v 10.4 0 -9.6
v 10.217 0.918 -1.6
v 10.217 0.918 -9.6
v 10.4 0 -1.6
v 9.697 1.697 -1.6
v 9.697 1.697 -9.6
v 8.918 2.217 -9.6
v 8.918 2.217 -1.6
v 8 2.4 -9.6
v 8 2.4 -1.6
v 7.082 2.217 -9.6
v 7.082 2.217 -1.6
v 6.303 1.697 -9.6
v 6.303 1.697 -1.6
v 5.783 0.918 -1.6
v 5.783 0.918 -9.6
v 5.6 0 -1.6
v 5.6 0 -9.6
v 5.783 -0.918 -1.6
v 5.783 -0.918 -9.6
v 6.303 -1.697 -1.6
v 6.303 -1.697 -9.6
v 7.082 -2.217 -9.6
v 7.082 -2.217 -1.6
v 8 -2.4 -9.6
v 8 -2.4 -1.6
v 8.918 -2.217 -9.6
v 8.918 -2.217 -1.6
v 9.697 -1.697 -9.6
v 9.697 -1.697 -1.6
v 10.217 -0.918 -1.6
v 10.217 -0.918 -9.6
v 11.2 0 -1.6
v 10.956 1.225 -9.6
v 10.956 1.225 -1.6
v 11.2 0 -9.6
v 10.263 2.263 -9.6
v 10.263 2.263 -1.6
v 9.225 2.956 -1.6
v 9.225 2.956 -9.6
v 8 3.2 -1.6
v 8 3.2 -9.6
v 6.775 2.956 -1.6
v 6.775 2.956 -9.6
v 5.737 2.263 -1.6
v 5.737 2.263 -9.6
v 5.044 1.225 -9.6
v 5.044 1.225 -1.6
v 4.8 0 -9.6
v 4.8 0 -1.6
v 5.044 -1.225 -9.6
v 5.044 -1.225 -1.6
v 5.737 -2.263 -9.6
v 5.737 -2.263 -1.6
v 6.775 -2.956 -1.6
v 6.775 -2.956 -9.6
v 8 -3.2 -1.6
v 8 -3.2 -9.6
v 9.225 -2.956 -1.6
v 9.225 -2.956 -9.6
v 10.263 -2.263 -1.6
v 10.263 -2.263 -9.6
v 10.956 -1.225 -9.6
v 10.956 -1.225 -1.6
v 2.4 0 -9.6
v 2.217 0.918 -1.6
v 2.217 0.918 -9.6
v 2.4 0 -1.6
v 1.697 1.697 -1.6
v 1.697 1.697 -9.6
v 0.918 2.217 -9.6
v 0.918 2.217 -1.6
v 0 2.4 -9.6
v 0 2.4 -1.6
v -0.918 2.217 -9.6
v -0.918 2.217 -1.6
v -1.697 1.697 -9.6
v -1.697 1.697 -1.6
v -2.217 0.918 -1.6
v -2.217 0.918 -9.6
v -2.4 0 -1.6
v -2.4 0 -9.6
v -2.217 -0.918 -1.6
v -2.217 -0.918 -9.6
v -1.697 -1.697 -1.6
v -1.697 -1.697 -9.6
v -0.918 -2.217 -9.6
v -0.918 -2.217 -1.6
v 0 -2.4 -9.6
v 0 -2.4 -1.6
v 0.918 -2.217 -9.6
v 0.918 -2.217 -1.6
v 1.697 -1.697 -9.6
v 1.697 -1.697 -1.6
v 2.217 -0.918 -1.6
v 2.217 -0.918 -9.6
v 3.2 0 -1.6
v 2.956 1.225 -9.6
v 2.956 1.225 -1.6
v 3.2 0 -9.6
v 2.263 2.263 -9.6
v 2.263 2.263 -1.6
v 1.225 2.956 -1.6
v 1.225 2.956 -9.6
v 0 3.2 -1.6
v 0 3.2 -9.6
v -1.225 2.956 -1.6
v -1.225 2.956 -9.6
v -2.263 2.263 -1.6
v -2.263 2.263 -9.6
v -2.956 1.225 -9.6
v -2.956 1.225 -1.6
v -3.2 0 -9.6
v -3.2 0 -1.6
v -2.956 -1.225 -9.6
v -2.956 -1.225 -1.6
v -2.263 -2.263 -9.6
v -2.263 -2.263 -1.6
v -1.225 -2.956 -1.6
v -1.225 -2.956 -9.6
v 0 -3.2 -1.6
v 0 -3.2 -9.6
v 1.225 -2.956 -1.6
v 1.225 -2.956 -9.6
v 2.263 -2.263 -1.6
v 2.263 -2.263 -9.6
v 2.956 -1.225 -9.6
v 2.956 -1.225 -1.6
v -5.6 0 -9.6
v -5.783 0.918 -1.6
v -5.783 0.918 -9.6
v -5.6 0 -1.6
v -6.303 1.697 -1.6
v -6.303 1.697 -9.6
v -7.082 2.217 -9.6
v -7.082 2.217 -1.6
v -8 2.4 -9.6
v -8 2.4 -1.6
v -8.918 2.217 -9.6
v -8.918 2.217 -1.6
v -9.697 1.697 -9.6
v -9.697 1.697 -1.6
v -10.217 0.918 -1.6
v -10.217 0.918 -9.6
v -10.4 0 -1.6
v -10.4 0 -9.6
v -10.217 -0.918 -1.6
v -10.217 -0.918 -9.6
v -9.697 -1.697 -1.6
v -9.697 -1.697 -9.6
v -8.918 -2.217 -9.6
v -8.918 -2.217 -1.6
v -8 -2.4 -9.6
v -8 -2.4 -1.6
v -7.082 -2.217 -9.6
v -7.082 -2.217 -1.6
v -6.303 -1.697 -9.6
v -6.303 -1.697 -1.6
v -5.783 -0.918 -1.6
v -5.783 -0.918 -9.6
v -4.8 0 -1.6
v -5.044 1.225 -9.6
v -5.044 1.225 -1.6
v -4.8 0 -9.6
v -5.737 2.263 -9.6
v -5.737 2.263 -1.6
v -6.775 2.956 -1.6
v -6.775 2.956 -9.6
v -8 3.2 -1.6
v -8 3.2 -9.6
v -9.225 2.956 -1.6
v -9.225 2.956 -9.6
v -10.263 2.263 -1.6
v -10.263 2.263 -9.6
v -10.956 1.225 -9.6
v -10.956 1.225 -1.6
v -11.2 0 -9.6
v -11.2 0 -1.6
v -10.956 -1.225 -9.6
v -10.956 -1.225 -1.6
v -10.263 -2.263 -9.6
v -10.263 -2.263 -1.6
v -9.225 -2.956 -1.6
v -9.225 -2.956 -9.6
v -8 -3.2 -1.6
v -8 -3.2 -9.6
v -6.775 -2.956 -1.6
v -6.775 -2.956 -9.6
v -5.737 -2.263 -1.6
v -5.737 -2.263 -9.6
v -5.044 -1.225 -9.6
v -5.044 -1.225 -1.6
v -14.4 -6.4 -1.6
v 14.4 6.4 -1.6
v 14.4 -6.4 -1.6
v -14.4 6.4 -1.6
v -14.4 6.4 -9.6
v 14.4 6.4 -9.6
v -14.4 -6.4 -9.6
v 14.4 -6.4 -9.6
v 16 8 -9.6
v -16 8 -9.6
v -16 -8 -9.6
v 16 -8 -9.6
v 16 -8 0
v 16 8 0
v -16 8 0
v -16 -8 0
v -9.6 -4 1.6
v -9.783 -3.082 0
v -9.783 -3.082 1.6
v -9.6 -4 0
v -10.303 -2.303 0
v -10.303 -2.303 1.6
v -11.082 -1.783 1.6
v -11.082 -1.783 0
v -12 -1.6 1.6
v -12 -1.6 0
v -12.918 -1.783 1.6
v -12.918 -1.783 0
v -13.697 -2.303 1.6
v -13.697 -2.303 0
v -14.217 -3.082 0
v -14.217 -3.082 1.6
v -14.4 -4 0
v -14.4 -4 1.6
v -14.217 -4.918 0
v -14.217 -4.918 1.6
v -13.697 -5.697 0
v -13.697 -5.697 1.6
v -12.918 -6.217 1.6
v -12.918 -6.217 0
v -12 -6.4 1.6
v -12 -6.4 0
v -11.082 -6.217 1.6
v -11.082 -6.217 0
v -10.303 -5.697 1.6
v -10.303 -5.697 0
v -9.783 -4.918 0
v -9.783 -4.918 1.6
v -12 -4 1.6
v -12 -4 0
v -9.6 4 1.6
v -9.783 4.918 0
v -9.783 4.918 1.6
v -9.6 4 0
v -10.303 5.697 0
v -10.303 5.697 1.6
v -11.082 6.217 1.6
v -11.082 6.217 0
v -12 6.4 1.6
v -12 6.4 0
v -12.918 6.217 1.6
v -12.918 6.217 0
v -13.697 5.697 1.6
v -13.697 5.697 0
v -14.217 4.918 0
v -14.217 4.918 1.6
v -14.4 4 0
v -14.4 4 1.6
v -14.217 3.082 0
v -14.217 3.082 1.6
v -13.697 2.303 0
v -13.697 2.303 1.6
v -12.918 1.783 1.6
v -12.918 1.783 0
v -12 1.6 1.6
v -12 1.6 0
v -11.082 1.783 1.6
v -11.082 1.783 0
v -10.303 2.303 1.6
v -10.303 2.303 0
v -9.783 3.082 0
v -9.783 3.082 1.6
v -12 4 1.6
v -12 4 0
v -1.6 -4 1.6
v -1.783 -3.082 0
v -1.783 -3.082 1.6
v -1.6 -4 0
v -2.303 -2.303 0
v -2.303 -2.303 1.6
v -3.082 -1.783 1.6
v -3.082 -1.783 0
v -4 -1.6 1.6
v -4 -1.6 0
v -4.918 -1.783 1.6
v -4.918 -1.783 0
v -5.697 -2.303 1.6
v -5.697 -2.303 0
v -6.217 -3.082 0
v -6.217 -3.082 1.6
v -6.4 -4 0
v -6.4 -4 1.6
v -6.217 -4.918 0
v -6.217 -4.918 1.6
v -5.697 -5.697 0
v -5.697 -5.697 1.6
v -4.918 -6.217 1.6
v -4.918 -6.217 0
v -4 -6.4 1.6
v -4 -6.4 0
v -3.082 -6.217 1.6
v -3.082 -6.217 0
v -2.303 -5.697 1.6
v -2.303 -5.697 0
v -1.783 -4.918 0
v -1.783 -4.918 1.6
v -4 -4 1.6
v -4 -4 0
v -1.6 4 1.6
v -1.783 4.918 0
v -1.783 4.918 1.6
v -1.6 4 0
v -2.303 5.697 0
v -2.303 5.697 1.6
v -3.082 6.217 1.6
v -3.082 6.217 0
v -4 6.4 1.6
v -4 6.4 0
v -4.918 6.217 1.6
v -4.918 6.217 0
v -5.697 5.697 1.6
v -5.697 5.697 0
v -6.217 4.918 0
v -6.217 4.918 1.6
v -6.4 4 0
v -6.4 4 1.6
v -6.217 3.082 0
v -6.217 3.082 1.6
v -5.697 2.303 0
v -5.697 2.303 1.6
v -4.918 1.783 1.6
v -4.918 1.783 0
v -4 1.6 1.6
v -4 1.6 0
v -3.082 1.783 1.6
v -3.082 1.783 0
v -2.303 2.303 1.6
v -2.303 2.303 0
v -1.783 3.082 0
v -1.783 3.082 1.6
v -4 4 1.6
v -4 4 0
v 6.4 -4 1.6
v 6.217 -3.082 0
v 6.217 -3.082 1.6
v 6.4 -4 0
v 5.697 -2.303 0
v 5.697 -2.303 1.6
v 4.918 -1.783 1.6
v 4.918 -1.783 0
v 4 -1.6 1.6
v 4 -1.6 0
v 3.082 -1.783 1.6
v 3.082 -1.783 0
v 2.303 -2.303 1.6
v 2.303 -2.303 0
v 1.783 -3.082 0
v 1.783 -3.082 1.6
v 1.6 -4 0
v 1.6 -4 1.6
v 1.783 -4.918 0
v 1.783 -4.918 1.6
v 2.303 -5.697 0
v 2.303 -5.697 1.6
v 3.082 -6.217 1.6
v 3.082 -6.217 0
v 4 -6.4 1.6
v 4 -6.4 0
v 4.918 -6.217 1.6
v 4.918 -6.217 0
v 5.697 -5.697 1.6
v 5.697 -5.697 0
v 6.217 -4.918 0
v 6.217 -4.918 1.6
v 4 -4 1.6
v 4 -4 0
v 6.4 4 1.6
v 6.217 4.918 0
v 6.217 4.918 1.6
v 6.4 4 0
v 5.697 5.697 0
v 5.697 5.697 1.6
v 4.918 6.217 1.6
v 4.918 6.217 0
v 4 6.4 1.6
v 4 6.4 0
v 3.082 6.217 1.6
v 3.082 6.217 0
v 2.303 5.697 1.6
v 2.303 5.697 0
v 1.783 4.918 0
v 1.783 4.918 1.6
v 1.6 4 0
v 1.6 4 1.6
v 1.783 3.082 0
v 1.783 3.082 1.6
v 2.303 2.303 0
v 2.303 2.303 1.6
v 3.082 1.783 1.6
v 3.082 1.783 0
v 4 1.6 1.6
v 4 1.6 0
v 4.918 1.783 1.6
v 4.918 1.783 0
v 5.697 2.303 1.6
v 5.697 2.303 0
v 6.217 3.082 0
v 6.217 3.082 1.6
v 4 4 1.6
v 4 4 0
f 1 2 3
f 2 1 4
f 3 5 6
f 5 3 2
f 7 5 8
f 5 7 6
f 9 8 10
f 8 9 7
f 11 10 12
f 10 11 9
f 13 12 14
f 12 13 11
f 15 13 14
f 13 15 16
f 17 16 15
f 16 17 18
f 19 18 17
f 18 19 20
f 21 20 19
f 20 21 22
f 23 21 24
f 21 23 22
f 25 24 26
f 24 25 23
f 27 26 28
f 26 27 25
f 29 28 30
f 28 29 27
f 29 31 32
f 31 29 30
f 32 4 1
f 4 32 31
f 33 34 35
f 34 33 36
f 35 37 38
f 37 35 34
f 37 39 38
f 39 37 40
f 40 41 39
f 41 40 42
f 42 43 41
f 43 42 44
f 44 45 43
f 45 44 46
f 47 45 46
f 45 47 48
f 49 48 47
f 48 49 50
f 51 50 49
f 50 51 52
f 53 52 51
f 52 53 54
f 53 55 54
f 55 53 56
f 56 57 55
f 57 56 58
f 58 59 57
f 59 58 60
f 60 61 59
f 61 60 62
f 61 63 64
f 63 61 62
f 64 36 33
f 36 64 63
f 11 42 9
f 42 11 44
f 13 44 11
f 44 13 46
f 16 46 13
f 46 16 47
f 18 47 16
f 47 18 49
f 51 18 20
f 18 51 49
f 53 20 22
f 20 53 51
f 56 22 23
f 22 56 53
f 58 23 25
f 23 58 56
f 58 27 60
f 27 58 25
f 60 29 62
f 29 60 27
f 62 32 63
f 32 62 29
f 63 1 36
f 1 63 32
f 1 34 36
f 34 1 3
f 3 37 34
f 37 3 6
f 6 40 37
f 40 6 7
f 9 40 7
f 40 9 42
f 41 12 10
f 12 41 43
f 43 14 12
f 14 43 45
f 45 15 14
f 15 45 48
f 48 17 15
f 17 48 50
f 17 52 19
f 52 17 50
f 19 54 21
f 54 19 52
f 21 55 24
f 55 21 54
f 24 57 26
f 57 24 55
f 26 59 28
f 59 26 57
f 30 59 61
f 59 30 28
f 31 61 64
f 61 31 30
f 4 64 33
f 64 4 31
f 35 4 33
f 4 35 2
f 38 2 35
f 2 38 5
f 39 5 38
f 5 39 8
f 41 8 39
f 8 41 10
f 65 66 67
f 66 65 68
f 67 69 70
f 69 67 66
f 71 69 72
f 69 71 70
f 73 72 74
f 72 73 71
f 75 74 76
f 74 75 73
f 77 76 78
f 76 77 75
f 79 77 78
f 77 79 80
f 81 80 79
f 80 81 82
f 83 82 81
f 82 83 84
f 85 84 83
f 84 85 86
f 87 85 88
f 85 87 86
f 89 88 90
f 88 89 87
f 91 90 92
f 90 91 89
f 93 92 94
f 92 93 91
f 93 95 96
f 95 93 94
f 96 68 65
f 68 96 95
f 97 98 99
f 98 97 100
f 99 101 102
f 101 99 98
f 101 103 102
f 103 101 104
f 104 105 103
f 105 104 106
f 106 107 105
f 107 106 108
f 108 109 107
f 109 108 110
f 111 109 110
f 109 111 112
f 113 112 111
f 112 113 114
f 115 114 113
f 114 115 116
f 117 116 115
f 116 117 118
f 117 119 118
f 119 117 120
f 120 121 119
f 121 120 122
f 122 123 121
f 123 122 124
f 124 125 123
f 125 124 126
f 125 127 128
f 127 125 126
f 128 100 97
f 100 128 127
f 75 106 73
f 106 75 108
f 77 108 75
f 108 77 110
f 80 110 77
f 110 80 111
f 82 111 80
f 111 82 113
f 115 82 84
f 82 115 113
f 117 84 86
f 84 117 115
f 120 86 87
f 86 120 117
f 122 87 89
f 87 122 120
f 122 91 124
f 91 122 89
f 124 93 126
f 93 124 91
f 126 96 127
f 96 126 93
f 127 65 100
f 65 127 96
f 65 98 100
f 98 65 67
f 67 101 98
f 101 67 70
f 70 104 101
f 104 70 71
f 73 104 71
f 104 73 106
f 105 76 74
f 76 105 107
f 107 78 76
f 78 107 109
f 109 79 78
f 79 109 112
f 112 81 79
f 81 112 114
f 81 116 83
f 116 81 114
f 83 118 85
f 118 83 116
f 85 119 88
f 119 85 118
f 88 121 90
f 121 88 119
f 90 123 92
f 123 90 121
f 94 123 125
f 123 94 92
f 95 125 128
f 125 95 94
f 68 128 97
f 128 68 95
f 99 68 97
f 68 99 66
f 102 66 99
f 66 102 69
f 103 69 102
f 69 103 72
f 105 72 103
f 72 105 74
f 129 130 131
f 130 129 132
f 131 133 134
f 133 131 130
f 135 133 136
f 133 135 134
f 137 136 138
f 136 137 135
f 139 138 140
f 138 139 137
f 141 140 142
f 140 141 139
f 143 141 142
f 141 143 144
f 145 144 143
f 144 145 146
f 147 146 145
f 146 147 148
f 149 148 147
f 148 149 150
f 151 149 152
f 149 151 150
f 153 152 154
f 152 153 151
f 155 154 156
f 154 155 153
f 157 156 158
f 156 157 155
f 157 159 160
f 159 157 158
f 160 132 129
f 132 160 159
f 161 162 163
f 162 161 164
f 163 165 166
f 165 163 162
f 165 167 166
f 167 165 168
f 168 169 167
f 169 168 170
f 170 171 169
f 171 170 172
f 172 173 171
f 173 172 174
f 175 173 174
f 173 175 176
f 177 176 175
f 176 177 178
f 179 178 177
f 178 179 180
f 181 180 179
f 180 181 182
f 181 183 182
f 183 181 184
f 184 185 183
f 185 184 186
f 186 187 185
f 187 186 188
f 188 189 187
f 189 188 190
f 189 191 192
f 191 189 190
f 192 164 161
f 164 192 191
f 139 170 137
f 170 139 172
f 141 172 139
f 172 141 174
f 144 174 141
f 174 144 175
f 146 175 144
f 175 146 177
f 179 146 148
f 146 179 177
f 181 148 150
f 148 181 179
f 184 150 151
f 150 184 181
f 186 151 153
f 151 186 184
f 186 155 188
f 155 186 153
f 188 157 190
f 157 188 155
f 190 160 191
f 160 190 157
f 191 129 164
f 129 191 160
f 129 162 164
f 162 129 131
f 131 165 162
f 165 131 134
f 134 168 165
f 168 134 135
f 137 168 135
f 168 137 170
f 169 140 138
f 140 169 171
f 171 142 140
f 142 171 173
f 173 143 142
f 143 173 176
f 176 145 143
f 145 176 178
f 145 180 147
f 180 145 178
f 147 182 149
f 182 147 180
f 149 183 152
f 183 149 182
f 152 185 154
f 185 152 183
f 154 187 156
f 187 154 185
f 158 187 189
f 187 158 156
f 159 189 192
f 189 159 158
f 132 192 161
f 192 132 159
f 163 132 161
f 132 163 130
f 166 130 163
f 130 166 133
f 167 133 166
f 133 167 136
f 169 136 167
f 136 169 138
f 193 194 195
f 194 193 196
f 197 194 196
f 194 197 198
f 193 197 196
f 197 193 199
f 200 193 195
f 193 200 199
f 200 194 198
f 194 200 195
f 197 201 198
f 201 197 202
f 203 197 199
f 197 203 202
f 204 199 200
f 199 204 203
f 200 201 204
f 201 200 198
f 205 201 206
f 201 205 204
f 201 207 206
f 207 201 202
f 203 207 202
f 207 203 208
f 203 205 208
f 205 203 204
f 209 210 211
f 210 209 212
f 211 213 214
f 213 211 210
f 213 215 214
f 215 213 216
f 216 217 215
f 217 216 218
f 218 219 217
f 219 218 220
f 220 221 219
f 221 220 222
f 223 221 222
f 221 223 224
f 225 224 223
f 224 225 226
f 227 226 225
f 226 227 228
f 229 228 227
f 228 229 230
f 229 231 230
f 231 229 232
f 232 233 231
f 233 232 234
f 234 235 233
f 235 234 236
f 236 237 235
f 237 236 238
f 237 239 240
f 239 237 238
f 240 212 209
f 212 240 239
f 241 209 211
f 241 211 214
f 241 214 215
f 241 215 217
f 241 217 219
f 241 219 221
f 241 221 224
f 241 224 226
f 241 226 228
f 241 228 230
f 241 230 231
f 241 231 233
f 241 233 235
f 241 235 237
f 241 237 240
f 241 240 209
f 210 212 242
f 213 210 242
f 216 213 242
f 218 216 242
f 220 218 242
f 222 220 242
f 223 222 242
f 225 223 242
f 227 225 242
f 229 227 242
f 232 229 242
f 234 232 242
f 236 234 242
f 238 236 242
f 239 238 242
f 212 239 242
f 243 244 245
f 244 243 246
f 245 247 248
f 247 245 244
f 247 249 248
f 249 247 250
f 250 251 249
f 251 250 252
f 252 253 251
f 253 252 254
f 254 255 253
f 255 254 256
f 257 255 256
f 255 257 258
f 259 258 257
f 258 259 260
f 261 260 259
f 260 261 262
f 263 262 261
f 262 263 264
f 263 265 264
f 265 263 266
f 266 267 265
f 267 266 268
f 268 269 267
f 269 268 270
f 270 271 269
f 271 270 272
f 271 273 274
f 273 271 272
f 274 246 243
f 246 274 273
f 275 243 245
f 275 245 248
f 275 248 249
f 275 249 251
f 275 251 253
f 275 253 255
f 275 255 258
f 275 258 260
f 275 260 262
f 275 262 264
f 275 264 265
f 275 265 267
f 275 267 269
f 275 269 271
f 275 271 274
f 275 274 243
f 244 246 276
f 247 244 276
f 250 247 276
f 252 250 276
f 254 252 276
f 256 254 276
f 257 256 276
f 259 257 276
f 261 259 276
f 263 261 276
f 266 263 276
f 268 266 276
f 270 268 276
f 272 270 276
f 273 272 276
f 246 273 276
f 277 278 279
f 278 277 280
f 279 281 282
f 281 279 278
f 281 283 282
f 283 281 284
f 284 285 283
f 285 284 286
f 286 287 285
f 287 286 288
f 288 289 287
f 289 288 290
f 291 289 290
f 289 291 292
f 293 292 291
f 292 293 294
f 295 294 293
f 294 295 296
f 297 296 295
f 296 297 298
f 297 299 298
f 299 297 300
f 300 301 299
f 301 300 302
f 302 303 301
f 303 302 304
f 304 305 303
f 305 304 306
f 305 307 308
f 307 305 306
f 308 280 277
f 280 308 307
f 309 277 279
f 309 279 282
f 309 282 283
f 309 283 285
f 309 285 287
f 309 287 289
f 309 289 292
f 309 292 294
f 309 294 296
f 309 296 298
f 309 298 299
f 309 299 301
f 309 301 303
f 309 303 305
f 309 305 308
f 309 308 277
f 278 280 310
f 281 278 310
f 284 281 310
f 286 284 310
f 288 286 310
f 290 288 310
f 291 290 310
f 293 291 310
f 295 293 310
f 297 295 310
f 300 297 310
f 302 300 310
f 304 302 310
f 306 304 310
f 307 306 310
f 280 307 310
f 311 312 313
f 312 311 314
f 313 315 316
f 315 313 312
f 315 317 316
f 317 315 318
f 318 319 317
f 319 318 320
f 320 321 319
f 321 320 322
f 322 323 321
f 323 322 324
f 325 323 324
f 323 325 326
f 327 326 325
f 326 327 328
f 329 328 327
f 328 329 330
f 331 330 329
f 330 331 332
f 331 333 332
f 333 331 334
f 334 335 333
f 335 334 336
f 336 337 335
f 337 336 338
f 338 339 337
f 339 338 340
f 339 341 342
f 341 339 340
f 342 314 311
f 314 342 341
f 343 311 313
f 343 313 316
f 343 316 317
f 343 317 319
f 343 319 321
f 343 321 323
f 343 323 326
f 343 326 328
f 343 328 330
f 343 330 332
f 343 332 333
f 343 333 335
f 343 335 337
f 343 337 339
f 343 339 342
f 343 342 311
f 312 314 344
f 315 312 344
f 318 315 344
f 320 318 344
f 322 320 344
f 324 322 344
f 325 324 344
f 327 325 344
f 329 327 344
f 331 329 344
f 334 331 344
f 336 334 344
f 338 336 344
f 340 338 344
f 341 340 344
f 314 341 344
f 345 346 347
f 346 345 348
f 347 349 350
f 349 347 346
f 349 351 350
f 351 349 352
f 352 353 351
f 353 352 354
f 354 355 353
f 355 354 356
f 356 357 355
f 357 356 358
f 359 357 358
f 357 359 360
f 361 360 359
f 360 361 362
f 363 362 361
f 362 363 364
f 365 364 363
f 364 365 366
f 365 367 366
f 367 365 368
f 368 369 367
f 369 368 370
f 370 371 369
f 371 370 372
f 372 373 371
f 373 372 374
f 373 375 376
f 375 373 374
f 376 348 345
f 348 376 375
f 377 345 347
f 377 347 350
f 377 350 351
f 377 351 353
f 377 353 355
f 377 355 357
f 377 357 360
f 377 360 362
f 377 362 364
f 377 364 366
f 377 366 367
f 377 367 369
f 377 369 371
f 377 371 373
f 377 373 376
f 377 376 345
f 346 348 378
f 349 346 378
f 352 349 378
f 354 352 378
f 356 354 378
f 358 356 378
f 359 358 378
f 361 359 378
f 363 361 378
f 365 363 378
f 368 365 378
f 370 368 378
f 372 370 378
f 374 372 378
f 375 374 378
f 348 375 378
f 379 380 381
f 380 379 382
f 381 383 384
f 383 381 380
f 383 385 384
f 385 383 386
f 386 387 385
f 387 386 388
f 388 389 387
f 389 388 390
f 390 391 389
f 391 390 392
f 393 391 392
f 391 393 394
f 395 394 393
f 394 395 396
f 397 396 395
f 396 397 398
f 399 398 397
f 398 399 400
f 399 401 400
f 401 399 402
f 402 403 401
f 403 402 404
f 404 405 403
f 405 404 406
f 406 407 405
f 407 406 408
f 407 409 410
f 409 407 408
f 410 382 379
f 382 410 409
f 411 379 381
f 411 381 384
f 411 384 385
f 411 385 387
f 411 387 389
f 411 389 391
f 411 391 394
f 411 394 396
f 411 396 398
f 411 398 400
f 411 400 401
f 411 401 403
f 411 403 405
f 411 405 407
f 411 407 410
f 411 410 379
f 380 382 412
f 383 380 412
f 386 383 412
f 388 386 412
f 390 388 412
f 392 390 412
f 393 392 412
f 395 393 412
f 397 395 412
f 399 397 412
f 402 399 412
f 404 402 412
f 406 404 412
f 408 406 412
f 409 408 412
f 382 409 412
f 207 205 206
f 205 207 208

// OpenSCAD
// file: ../p/4-4ring3.scad
use <../lib.scad>
$fa=1; $fs=0.2;
function ldraw_lib__4_4ring3(realsolid=false) = [
// 0 Ring  3 x 1.0
// 0 Name: 4-4ring3.dat
// 0 Author: James Jessiman
// 0 !LDRAW_ORG Primitive UPDATE 2009-01
// 0 !LICENSE Licensed under CC BY 2.0 and CC BY 4.0 : see CAreadme.txt
// 
// 0 BFC CERTIFY CCW
  [0,"BFC","CERTIFY"],
  [0,"BFC","CCW"],
// 
// 0 !HISTORY 1998-12-15 [PTadmin] Official Update 1998-10
// 0 !HISTORY 2002-04-05 [hafhead] Added BFC statement
// 0 !HISTORY 2002-04-25 [PTadmin] Official Update 2002-02
// 0 !HISTORY 2007-06-24 [PTadmin] Header formatted for Contributor Agreement
// 0 !HISTORY 2008-07-01 [PTadmin] Official Update 2008-01
// 0 !HISTORY 2008-08-26 [cwdee] Switch polygon winding and rename
// 0 !HISTORY 2009-05-02 [PTadmin] Official Update 2009-01
// 
// 
// 4 16 -1.5308 0 3.6956 -1.1481 0 2.7717 0 0 3 0 0 4
  [4,16,-1.5308,0,3.6956,-1.1481,0,2.7717,0,0,3,0,0,4],
// 4 16 -2.8284 0 2.8284 -2.1213 0 2.1213 -1.1481 0 2.7717 -1.5308 0 3.6956
  [4,16,-2.8284,0,2.8284,-2.1213,0,2.1213,-1.1481,0,2.7717,-1.5308,0,3.6956],
// 4 16 -3.6956 0 1.5308 -2.7717 0 1.1481 -2.1213 0 2.1213 -2.8284 0 2.8284
  [4,16,-3.6956,0,1.5308,-2.7717,0,1.1481,-2.1213,0,2.1213,-2.8284,0,2.8284],
// 4 16 -4 0 0 -3 0 0 -2.7717 0 1.1481 -3.6956 0 1.5308
  [4,16,-4,0,0,-3,0,0,-2.7717,0,1.1481,-3.6956,0,1.5308],
// 4 16 -3.6956 0 -1.5308 -2.7717 0 -1.1481 -3 0 0 -4 0 0
  [4,16,-3.6956,0,-1.5308,-2.7717,0,-1.1481,-3,0,0,-4,0,0],
// 4 16 -2.8284 0 -2.8284 -2.1213 0 -2.1213 -2.7717 0 -1.1481 -3.6956 0 -1.5308
  [4,16,-2.8284,0,-2.8284,-2.1213,0,-2.1213,-2.7717,0,-1.1481,-3.6956,0,-1.5308],
// 4 16 -1.5308 0 -3.6956 -1.1481 0 -2.7717 -2.1213 0 -2.1213 -2.8284 0 -2.8284
  [4,16,-1.5308,0,-3.6956,-1.1481,0,-2.7717,-2.1213,0,-2.1213,-2.8284,0,-2.8284],
// 4 16 0 0 -4 0 0 -3 -1.1481 0 -2.7717 -1.5308 0 -3.6956
  [4,16,0,0,-4,0,0,-3,-1.1481,0,-2.7717,-1.5308,0,-3.6956],
// 4 16 1.5308 0 -3.6956 1.1481 0 -2.7717 0 0 -3 0 0 -4
  [4,16,1.5308,0,-3.6956,1.1481,0,-2.7717,0,0,-3,0,0,-4],
// 4 16 2.8284 0 -2.8284 2.1213 0 -2.1213 1.1481 0 -2.7717 1.5308 0 -3.6956
  [4,16,2.8284,0,-2.8284,2.1213,0,-2.1213,1.1481,0,-2.7717,1.5308,0,-3.6956],
// 4 16 3.6956 0 -1.5308 2.7717 0 -1.1481 2.1213 0 -2.1213 2.8284 0 -2.8284
  [4,16,3.6956,0,-1.5308,2.7717,0,-1.1481,2.1213,0,-2.1213,2.8284,0,-2.8284],
// 4 16 4 0 0 3 0 0 2.7717 0 -1.1481 3.6956 0 -1.5308
  [4,16,4,0,0,3,0,0,2.7717,0,-1.1481,3.6956,0,-1.5308],
// 4 16 3.6956 0 1.5308 2.7717 0 1.1481 3 0 0 4 0 0
  [4,16,3.6956,0,1.5308,2.7717,0,1.1481,3,0,0,4,0,0],
// 4 16 2.8284 0 2.8284 2.1213 0 2.1213 2.7717 0 1.1481 3.6956 0 1.5308
  [4,16,2.8284,0,2.8284,2.1213,0,2.1213,2.7717,0,1.1481,3.6956,0,1.5308],
// 4 16 1.5308 0 3.6956 1.1481 0 2.7717 2.1213 0 2.1213 2.8284 0 2.8284
  [4,16,1.5308,0,3.6956,1.1481,0,2.7717,2.1213,0,2.1213,2.8284,0,2.8284],
// 4 16 0 0 4 0 0 3 1.1481 0 2.7717 1.5308 0 3.6956
  [4,16,0,0,4,0,0,3,1.1481,0,2.7717,1.5308,0,3.6956],
// 0
];
module ldraw_lib__4_4ring3(step=0, col=false, unit=2/5, alt=false, line=0.2, solid=!$preview)
    makepoly(ldraw_lib__4_4ring3(solid), step=step, col=col, unit=unit, alt=alt, line=line, solid=solid);
ldraw_lib__4_4ring3(line=0.2);
// file: ../p/4-4edge.scad
use <../lib.scad>
function ldraw_lib__4_4edge() = [
// 0 Circle 1.0
// 0 Name: 4-4edge.dat
// 0 Author: James Jessiman
// 0 !LDRAW_ORG Primitive UPDATE 2017-01
// 0 !LICENSE Licensed under CC BY 2.0 and CC BY 4.0 : see CAreadme.txt
// 
// 0 BFC CERTIFY CCW
  [0,"BFC","CERTIFY"],
  [0,"BFC","CCW"],
// 
// 0 !HISTORY 1998-12-15 [PTadmin] Official Update 1998-10
// 0 !HISTORY 2005-12-28 [PTadmin] Official Update 2005-01
// 0 !HISTORY 2007-06-24 [PTadmin] Header formatted for Contributor Agreement
// 0 !HISTORY 2008-07-01 [PTadmin] Official Update 2008-01
// 0 !HISTORY 2017-01-15 [Steffen] BFCed
// 0 !HISTORY 2017-12-30 [PTadmin] Official Update 2017-01
// 
// 
// 2 24 1 0 0 0.9239 0 0.3827
  [2,24,1,0,0,0.9239,0,0.3827],
// 2 24 0.9239 0 0.3827 0.7071 0 0.7071
  [2,24,0.9239,0,0.3827,0.7071,0,0.7071],
// 2 24 0.7071 0 0.7071 0.3827 0 0.9239
  [2,24,0.7071,0,0.7071,0.3827,0,0.9239],
// 2 24 0.3827 0 0.9239 0 0 1
  [2,24,0.3827,0,0.9239,0,0,1],
// 2 24 0 0 1 -0.3827 0 0.9239
  [2,24,0,0,1,-0.3827,0,0.9239],
// 2 24 -0.3827 0 0.9239 -0.7071 0 0.7071
  [2,24,-0.3827,0,0.9239,-0.7071,0,0.7071],
// 2 24 -0.7071 0 0.7071 -0.9239 0 0.3827
  [2,24,-0.7071,0,0.7071,-0.9239,0,0.3827],
// 2 24 -0.9239 0 0.3827 -1 0 -0
  [2,24,-0.9239,0,0.3827,-1,0,-0],
// 2 24 -1 0 -0 -0.9239 0 -0.3827
  [2,24,-1,0,-0,-0.9239,0,-0.3827],
// 2 24 -0.9239 0 -0.3827 -0.7071 0 -0.7071
  [2,24,-0.9239,0,-0.3827,-0.7071,0,-0.7071],
// 2 24 -0.7071 0 -0.7071 -0.3827 0 -0.9239
  [2,24,-0.7071,0,-0.7071,-0.3827,0,-0.9239],
// 2 24 -0.3827 0 -0.9239 0 0 -1
  [2,24,-0.3827,0,-0.9239,0,0,-1],
// 2 24 0 0 -1 0.3827 0 -0.9239
  [2,24,0,0,-1,0.3827,0,-0.9239],
// 2 24 0.3827 0 -0.9239 0.7071 0 -0.7071
  [2,24,0.3827,0,-0.9239,0.7071,0,-0.7071],
// 2 24 0.7071 0 -0.7071 0.9239 0 -0.3827
  [2,24,0.7071,0,-0.7071,0.9239,0,-0.3827],
// 2 24 0.9239 0 -0.3827 1 0 0
  [2,24,0.9239,0,-0.3827,1,0,0],
];
module ldraw_lib__4_4edge(step=0, col=false, unit=2/5, alt=false, line=0.2, solid=!$preview)
    makepoly(ldraw_lib__4_4edge(), step=step, col=col, unit=unit, alt=alt, line=line, solid=solid);
ldraw_lib__4_4edge(line=0.2);
// file: ../p/4-4disc.scad
use <../lib.scad>
function ldraw_lib__4_4disc() = [
// 0 Disc 1.0
// 0 Name: 4-4disc.dat
// 0 Author: James Jessiman
// 0 !LDRAW_ORG Primitive UPDATE 2002-02
// 0 !LICENSE Licensed under CC BY 2.0 and CC BY 4.0 : see CAreadme.txt
// 
// 0 BFC CERTIFY CCW
  [0,"BFC","CERTIFY"],
  [0,"BFC","CCW"],
// 
// 0 !HISTORY 1998-12-15 [PTadmin] Official Update 1998-10
// 0 !HISTORY 2002-03-23 [sbliss] Added BFC statement
// 0 !HISTORY 2002-04-25 [PTadmin] Official Update 2002-02
// 0 !HISTORY 2007-06-24 [PTadmin] Header formatted for Contributor Agreement
// 0 !HISTORY 2008-07-01 [PTadmin] Official Update 2008-01
// 
// 
// 3 16 0 0 0 1 0 0 0.9239 0 0.3827
  [3,16,0,0,0,1,0,0,0.9239,0,0.3827],
// 3 16 0 0 0 0.9239 0 0.3827 0.7071 0 0.7071
  [3,16,0,0,0,0.9239,0,0.3827,0.7071,0,0.7071],
// 3 16 0 0 0 0.7071 0 0.7071 0.3827 0 0.9239
  [3,16,0,0,0,0.7071,0,0.7071,0.3827,0,0.9239],
// 3 16 0 0 0 0.3827 0 0.9239 0 0 1
  [3,16,0,0,0,0.3827,0,0.9239,0,0,1],
// 3 16 0 0 0 0 0 1 -0.3827 0 0.9239
  [3,16,0,0,0,0,0,1,-0.3827,0,0.9239],
// 3 16 0 0 0 -0.3827 0 0.9239 -0.7071 0 0.7071
  [3,16,0,0,0,-0.3827,0,0.9239,-0.7071,0,0.7071],
// 3 16 0 0 0 -0.7071 0 0.7071 -0.9239 0 0.3827
  [3,16,0,0,0,-0.7071,0,0.7071,-0.9239,0,0.3827],
// 3 16 0 0 0 -0.9239 0 0.3827 -1 0 -0
  [3,16,0,0,0,-0.9239,0,0.3827,-1,0,-0],
// 3 16 0 0 0 -1 0 -0 -0.9239 0 -0.3827
  [3,16,0,0,0,-1,0,-0,-0.9239,0,-0.3827],
// 3 16 0 0 0 -0.9239 0 -0.3827 -0.7071 0 -0.7071
  [3,16,0,0,0,-0.9239,0,-0.3827,-0.7071,0,-0.7071],
// 3 16 0 0 0 -0.7071 0 -0.7071 -0.3827 0 -0.9239
  [3,16,0,0,0,-0.7071,0,-0.7071,-0.3827,0,-0.9239],
// 3 16 0 0 0 -0.3827 0 -0.9239 0 0 -1
  [3,16,0,0,0,-0.3827,0,-0.9239,0,0,-1],
// 3 16 0 0 0 0 0 -1 0.3827 0 -0.9239
  [3,16,0,0,0,0,0,-1,0.3827,0,-0.9239],
// 3 16 0 0 0 0.3827 0 -0.9239 0.7071 0 -0.7071
  [3,16,0,0,0,0.3827,0,-0.9239,0.7071,0,-0.7071],
// 3 16 0 0 0 0.7071 0 -0.7071 0.9239 0 -0.3827
  [3,16,0,0,0,0.7071,0,-0.7071,0.9239,0,-0.3827],
// 3 16 0 0 0 0.9239 0 -0.3827 1 0 0
  [3,16,0,0,0,0.9239,0,-0.3827,1,0,0],
// 0
];
module ldraw_lib__4_4disc(step=0, col=false, unit=2/5, alt=false, line=0.2, solid=!$preview)
    makepoly(ldraw_lib__4_4disc(), step=step, col=col, unit=unit, alt=alt, line=line, solid=solid);
ldraw_lib__4_4disc(line=0.2);
// file: ../p/4-4cyli.scad
use <../lib.scad>
$fa=1; $fs=0.2;
function ldraw_lib__4_4cyli(realsolid=false) = [
// 0 Cylinder 1.0
// 0 Name: 4-4cyli.dat
// 0 Author: James Jessiman
// 0 !LDRAW_ORG Primitive UPDATE 2005-01
// 0 !LICENSE Licensed under CC BY 2.0 and CC BY 4.0 : see CAreadme.txt
// 
// 0 BFC CERTIFY CCW
  [0,"BFC","CERTIFY"],
  [0,"BFC","CCW"],
// 
// 0 !HISTORY 1998-12-15 [PTadmin] Official Update 1998-10
// 0 !HISTORY 2002-03-23 [sbliss] Added BFC statement; merged headers from files in distributions LDraw 0.27 and Complete.
// 0 !HISTORY 2002-04-25 [PTadmin] Official Update 2002-02
// 0 !HISTORY 2004-12-14 [guyvivan] BFC CCW
// 0 !HISTORY 2005-12-28 [PTadmin] Official Update 2005-01
// 0 !HISTORY 2007-06-24 [PTadmin] Header formatted for Contributor Agreement
// 0 !HISTORY 2008-07-01 [PTadmin] Official Update 2008-01
// 
// 
// 4 16 1 1 0 0.9239 1 0.3827 0.9239 0 0.3827 1 0 0
  [4,16,1,1,0,0.9239,1,0.3827,0.9239,0,0.3827,1,0,0],
// 5 24 1 0 0 1 1 0 0.9239 0 0.3827 0.9239 0 -0.3827
  [5,24,1,0,0,1,1,0,0.9239,0,0.3827,0.9239,0,-0.3827],
// 4 16 0.9239 1 0.3827 0.7071 1 0.7071 0.7071 0 0.7071 0.9239 0 0.3827
  [4,16,0.9239,1,0.3827,0.7071,1,0.7071,0.7071,0,0.7071,0.9239,0,0.3827],
// 5 24 0.9239 0 0.3827 0.9239 1 0.3827 0.7071 0 0.7071 1 0 0
  [5,24,0.9239,0,0.3827,0.9239,1,0.3827,0.7071,0,0.7071,1,0,0],
// 4 16 0.7071 1 0.7071 0.3827 1 0.9239 0.3827 0 0.9239 0.7071 0 0.7071
  [4,16,0.7071,1,0.7071,0.3827,1,0.9239,0.3827,0,0.9239,0.7071,0,0.7071],
// 5 24 0.7071 0 0.7071 0.7071 1 0.7071 0.3827 0 0.9239 0.9239 0 0.3827
  [5,24,0.7071,0,0.7071,0.7071,1,0.7071,0.3827,0,0.9239,0.9239,0,0.3827],
// 4 16 0.3827 1 0.9239 0 1 1 0 0 1 0.3827 0 0.9239
  [4,16,0.3827,1,0.9239,0,1,1,0,0,1,0.3827,0,0.9239],
// 5 24 0.3827 0 0.9239 0.3827 1 0.9239 0 0 1 0.7071 0 0.7071
  [5,24,0.3827,0,0.9239,0.3827,1,0.9239,0,0,1,0.7071,0,0.7071],
// 4 16 0 1 1 -0.3827 1 0.9239 -0.3827 0 0.9239 0 0 1
  [4,16,0,1,1,-0.3827,1,0.9239,-0.3827,0,0.9239,0,0,1],
// 5 24 0 0 1 0 1 1 -0.3827 0 0.9239 0.3827 0 0.9239
  [5,24,0,0,1,0,1,1,-0.3827,0,0.9239,0.3827,0,0.9239],
// 4 16 -0.3827 1 0.9239 -0.7071 1 0.7071 -0.7071 0 0.7071 -0.3827 0 0.9239
  [4,16,-0.3827,1,0.9239,-0.7071,1,0.7071,-0.7071,0,0.7071,-0.3827,0,0.9239],
// 5 24 -0.3827 0 0.9239 -0.3827 1 0.9239 -0.7071 0 0.7071 0 0 1
  [5,24,-0.3827,0,0.9239,-0.3827,1,0.9239,-0.7071,0,0.7071,0,0,1],
// 4 16 -0.7071 1 0.7071 -0.9239 1 0.3827 -0.9239 0 0.3827 -0.7071 0 0.7071
  [4,16,-0.7071,1,0.7071,-0.9239,1,0.3827,-0.9239,0,0.3827,-0.7071,0,0.7071],
// 5 24 -0.7071 0 0.7071 -0.7071 1 0.7071 -0.9239 0 0.3827 -0.3827 0 0.9239
  [5,24,-0.7071,0,0.7071,-0.7071,1,0.7071,-0.9239,0,0.3827,-0.3827,0,0.9239],
// 4 16 -0.9239 1 0.3827 -1 1 0 -1 0 0 -0.9239 0 0.3827
  [4,16,-0.9239,1,0.3827,-1,1,0,-1,0,0,-0.9239,0,0.3827],
// 5 24 -0.9239 0 0.3827 -0.9239 1 0.3827 -1 0 0 -0.7071 0 0.7071
  [5,24,-0.9239,0,0.3827,-0.9239,1,0.3827,-1,0,0,-0.7071,0,0.7071],
// 4 16 -1 1 0 -0.9239 1 -0.3827 -0.9239 0 -0.3827 -1 0 0
  [4,16,-1,1,0,-0.9239,1,-0.3827,-0.9239,0,-0.3827,-1,0,0],
// 5 24 -1 0 0 -1 1 0 -0.9239 0 -0.3827 -0.9239 0 0.3827
  [5,24,-1,0,0,-1,1,0,-0.9239,0,-0.3827,-0.9239,0,0.3827],
// 4 16 -0.9239 1 -0.3827 -0.7071 1 -0.7071 -0.7071 0 -0.7071 -0.9239 0 -0.3827
  [4,16,-0.9239,1,-0.3827,-0.7071,1,-0.7071,-0.7071,0,-0.7071,-0.9239,0,-0.3827],
// 5 24 -0.9239 0 -0.3827 -0.9239 1 -0.3827 -0.7071 0 -0.7071 -1 0 0
  [5,24,-0.9239,0,-0.3827,-0.9239,1,-0.3827,-0.7071,0,-0.7071,-1,0,0],
// 4 16 -0.7071 1 -0.7071 -0.3827 1 -0.9239 -0.3827 0 -0.9239 -0.7071 0 -0.7071
  [4,16,-0.7071,1,-0.7071,-0.3827,1,-0.9239,-0.3827,0,-0.9239,-0.7071,0,-0.7071],
// 5 24 -0.7071 0 -0.7071 -0.7071 1 -0.7071 -0.3827 0 -0.9239 -0.9239 0 -0.3827
  [5,24,-0.7071,0,-0.7071,-0.7071,1,-0.7071,-0.3827,0,-0.9239,-0.9239,0,-0.3827],
// 4 16 -0.3827 1 -0.9239 0 1 -1 0 0 -1 -0.3827 0 -0.9239
  [4,16,-0.3827,1,-0.9239,0,1,-1,0,0,-1,-0.3827,0,-0.9239],
// 5 24 -0.3827 0 -0.9239 -0.3827 1 -0.9239 0 0 -1 -0.7071 0 -0.7071
  [5,24,-0.3827,0,-0.9239,-0.3827,1,-0.9239,0,0,-1,-0.7071,0,-0.7071],
// 4 16 0 1 -1 0.3827 1 -0.9239 0.3827 0 -0.9239 0 0 -1
  [4,16,0,1,-1,0.3827,1,-0.9239,0.3827,0,-0.9239,0,0,-1],
// 5 24 0 0 -1 0 1 -1 0.3827 0 -0.9239 -0.3827 0 -0.9239
  [5,24,0,0,-1,0,1,-1,0.3827,0,-0.9239,-0.3827,0,-0.9239],
// 4 16 0.3827 1 -0.9239 0.7071 1 -0.7071 0.7071 0 -0.7071 0.3827 0 -0.9239
  [4,16,0.3827,1,-0.9239,0.7071,1,-0.7071,0.7071,0,-0.7071,0.3827,0,-0.9239],
// 5 24 0.3827 0 -0.9239 0.3827 1 -0.9239 0.7071 0 -0.7071 0 0 -1
  [5,24,0.3827,0,-0.9239,0.3827,1,-0.9239,0.7071,0,-0.7071,0,0,-1],
// 4 16 0.7071 1 -0.7071 0.9239 1 -0.3827 0.9239 0 -0.3827 0.7071 0 -0.7071
  [4,16,0.7071,1,-0.7071,0.9239,1,-0.3827,0.9239,0,-0.3827,0.7071,0,-0.7071],
// 5 24 0.7071 0 -0.7071 0.7071 1 -0.7071 0.9239 0 -0.3827 0.3827 0 -0.9239
  [5,24,0.7071,0,-0.7071,0.7071,1,-0.7071,0.9239,0,-0.3827,0.3827,0,-0.9239],
// 4 16 0.9239 1 -0.3827 1 1 0 1 0 0 0.9239 0 -0.3827
  [4,16,0.9239,1,-0.3827,1,1,0,1,0,0,0.9239,0,-0.3827],
// 5 24 0.9239 0 -0.3827 0.9239 1 -0.3827 1 0 0 0.7071 0 -0.7071
  [5,24,0.9239,0,-0.3827,0.9239,1,-0.3827,1,0,0,0.7071,0,-0.7071],
// 0
];
module ldraw_lib__4_4cyli(step=0, col=false, unit=2/5, alt=false, line=0.2, solid=!$preview)
    makepoly(ldraw_lib__4_4cyli(solid), step=step, col=col, unit=unit, alt=alt, line=line, solid=solid);
ldraw_lib__4_4cyli(line=0.2);
// file: ../p/stud4.scad
use <../lib.scad>
use <4-4cyli.scad>
use <4-4edge.scad>
use <4-4ring3.scad>
function ldraw_lib__stud4() = [
// 0 Stud Tube Open
// 0 Name: stud4.dat
// 0 Author: James Jessiman
// 0 !LDRAW_ORG Primitive UPDATE 2009-02
// 0 !LICENSE Licensed under CC BY 4.0 : see CAreadme.txt
// 
// 0 BFC CERTIFY CCW
  [0,"BFC","CERTIFY"],
  [0,"BFC","CCW"],
// 
// 0 !HISTORY 1999-07-05 [PTadmin] Official Update 1999-05
// 0 !HISTORY 2002-04-04 [sbliss] Modified for BFC compliance
// 0 !HISTORY 2002-04-25 [PTadmin] Official Update 2002-02
// 0 !HISTORY 2007-06-24 [PTadmin] Header formatted for Contributor Agreement
// 0 !HISTORY 2008-07-01 [PTadmin] Official Update 2008-01
// 0 !HISTORY 2009-06-21 [cwdee] Update ring references to 4-4ring
// 0 !HISTORY 2009-09-03 [PTadmin] Official Update 2009-02
// 
// 
// 1 16 0 -4 0 6 0 0 0 1 0 0 0 6 4-4edge.dat
  [1,16,0,-4,0,6,0,0,0,1,0,0,0,6, ldraw_lib__4_4edge()],
// 1 16 0 -4 0 8 0 0 0 1 0 0 0 8 4-4edge.dat
  [1,16,0,-4,0,8,0,0,0,1,0,0,0,8, ldraw_lib__4_4edge()],
// 1 16 0 0 0 6 0 0 0 1 0 0 0 6 4-4edge.dat
  [1,16,0,0,0,6,0,0,0,1,0,0,0,6, ldraw_lib__4_4edge()],
// 1 16 0 0 0 8 0 0 0 1 0 0 0 8 4-4edge.dat
  [1,16,0,0,0,8,0,0,0,1,0,0,0,8, ldraw_lib__4_4edge()],
// 0 BFC INVERTNEXT
  [0,"BFC","INVERTNEXT"],
// 1 16 0 -4 0 6 0 0 0 4 0 0 0 6 4-4cyli.dat
  [1,16,0,-4,0,6,0,0,0,4,0,0,0,6, ldraw_lib__4_4cyli()],
// 1 16 0 -4 0 8 0 0 0 4 0 0 0 8 4-4cyli.dat
  [1,16,0,-4,0,8,0,0,0,4,0,0,0,8, ldraw_lib__4_4cyli()],
// 1 16 0 -4 0 2 0 0 0 1 0 0 0 2 4-4ring3.dat
  [1,16,0,-4,0,2,0,0,0,1,0,0,0,2, ldraw_lib__4_4ring3()],
  [-1,16,0,0,0,2,0,0,0,-1,0,0,0,2, ldraw_lib__4_4ring3()],
// 0
];
module ldraw_lib__stud4(step=0, col=false, unit=2/5, alt=false, line=0.2, solid=!$preview)
    makepoly(ldraw_lib__stud4(), step=step, col=col, unit=unit, alt=alt, line=line, solid=solid);
ldraw_lib__stud4(line=0.2);
// file: ../p/box5.scad
use <../lib.scad>
function ldraw_lib__box5() = [
// 0 Box with 5 Faces and All Edges
// 0 Name: box5.dat
// 0 Author: James Jessiman
// 0 !LDRAW_ORG Primitive UPDATE 2012-01
// 0 !LICENSE Licensed under CC BY 2.0 and CC BY 4.0 : see CAreadme.txt
// 
// 0 BFC CERTIFY CCW
  [0,"BFC","CERTIFY"],
  [0,"BFC","CCW"],
// 
// 0 !HISTORY 2002-04-03 [sbliss] Modified for BFC compliance
// 0 !HISTORY 2002-04-25 [PTadmin] Official Update 2002-02
// 0 !HISTORY 2007-06-24 [PTadmin] Header formatted for Contributor Agreement
// 0 !HISTORY 2008-07-01 [PTadmin] Official Update 2008-01
// 0 !HISTORY 2012-02-16 [Philo] Changed to CCW
// 0 !HISTORY 2012-03-30 [PTadmin] Official Update 2012-01
// 
// 
// 2 24 1 1 1 -1 1 1
  [2,24,1,1,1,-1,1,1],
// 2 24 -1 1 1 -1 1 -1
  [2,24,-1,1,1,-1,1,-1],
// 2 24 -1 1 -1 1 1 -1
  [2,24,-1,1,-1,1,1,-1],
// 2 24 1 1 -1 1 1 1
  [2,24,1,1,-1,1,1,1],
// 2 24 1 0 1 -1 0 1
  [2,24,1,0,1,-1,0,1],
// 2 24 -1 0 1 -1 0 -1
  [2,24,-1,0,1,-1,0,-1],
// 2 24 -1 0 -1 1 0 -1
  [2,24,-1,0,-1,1,0,-1],
// 2 24 1 0 -1 1 0 1
  [2,24,1,0,-1,1,0,1],
// 2 24 1 0 1 1 1 1
  [2,24,1,0,1,1,1,1],
// 2 24 -1 0 1 -1 1 1
  [2,24,-1,0,1,-1,1,1],
// 2 24 1 0 -1 1 1 -1
  [2,24,1,0,-1,1,1,-1],
// 2 24 -1 0 -1 -1 1 -1
  [2,24,-1,0,-1,-1,1,-1],
// 4 16 -1 1 1 1 1 1 1 1 -1 -1 1 -1
  [4,16,-1,1,1,1,1,1,1,1,-1,-1,1,-1],
// 4 16 -1 1 1 -1 0 1 1 0 1 1 1 1
  [4,16,-1,1,1,-1,0,1,1,0,1,1,1,1],
// 4 16 -1 1 -1 -1 0 -1 -1 0 1 -1 1 1
  [4,16,-1,1,-1,-1,0,-1,-1,0,1,-1,1,1],
// 4 16 1 1 -1 1 0 -1 -1 0 -1 -1 1 -1
  [4,16,1,1,-1,1,0,-1,-1,0,-1,-1,1,-1],
// 4 16 1 1 1 1 0 1 1 0 -1 1 1 -1
  [4,16,1,1,1,1,0,1,1,0,-1,1,1,-1],
];
makepoly(ldraw_lib__box5(), line=0.2);
// file: ../p/box4.scad
use <../lib.scad>
function ldraw_lib__box4() = [
// 0 Box with 4 Faces (2 Parallel Pairs) and All Edges
// 0 Name: box4.dat
// 0 Author: James Jessiman
// 0 !LDRAW_ORG Primitive UPDATE 2012-01
// 0 !LICENSE Licensed under CC BY 4.0 : see CAreadme.txt
// 
// 0 BFC CERTIFY CCW
  [0,"BFC","CERTIFY"],
  [0,"BFC","CCW"],
// 
// 0 !HISTORY 2002-04-03 [sbliss] Modified for BFC compliance
// 0 !HISTORY 2002-04-25 [PTadmin] Official Update 2002-02
// 0 !HISTORY 2007-06-24 [PTadmin] Header formatted for Contributor Agreement
// 0 !HISTORY 2008-07-01 [PTadmin] Official Update 2008-01
// 0 !HISTORY 2012-02-16 [Philo] Changed to CCW
// 0 !HISTORY 2012-03-30 [PTadmin] Official Update 2012-01
// 
// 
// 2 24 1 1 1 -1 1 1
  [2,24,1,1,1,-1,1,1],
// 2 24 -1 1 1 -1 1 -1
  [2,24,-1,1,1,-1,1,-1],
// 2 24 -1 1 -1 1 1 -1
  [2,24,-1,1,-1,1,1,-1],
// 2 24 1 1 -1 1 1 1
  [2,24,1,1,-1,1,1,1],
// 2 24 1 0 1 -1 0 1
  [2,24,1,0,1,-1,0,1],
// 2 24 -1 0 1 -1 0 -1
  [2,24,-1,0,1,-1,0,-1],
// 2 24 -1 0 -1 1 0 -1
  [2,24,-1,0,-1,1,0,-1],
// 2 24 1 0 -1 1 0 1
  [2,24,1,0,-1,1,0,1],
// 2 24 1 0 1 1 1 1
  [2,24,1,0,1,1,1,1],
// 2 24 -1 0 1 -1 1 1
  [2,24,-1,0,1,-1,1,1],
// 2 24 1 0 -1 1 1 -1
  [2,24,1,0,-1,1,1,-1],
// 2 24 -1 0 -1 -1 1 -1
  [2,24,-1,0,-1,-1,1,-1],
// 4 16 -1 1 1 -1 0 1 1 0 1 1 1 1
  [4,16,-1,1,1,-1,0,1,1,0,1,1,1,1],
// 4 16 -1 1 -1 -1 0 -1 -1 0 1 -1 1 1
  [4,16,-1,1,-1,-1,0,-1,-1,0,1,-1,1,1],
// 4 16 1 1 -1 1 0 -1 -1 0 -1 -1 1 -1
  [4,16,1,1,-1,1,0,-1,-1,0,-1,-1,1,-1],
// 4 16 1 1 1 1 0 1 1 0 -1 1 1 -1
  [4,16,1,1,1,1,0,1,1,0,-1,1,1,-1],
];
module ldraw_lib__box4(step=0, col=false, unit=2/5, alt=false, line=0.2, solid=!$preview)
    makepoly(ldraw_lib__box4(), step=step, col=col, unit=unit, alt=alt, line=line, solid=solid);
ldraw_lib__box4(line=0.2);
// file: ../p/stud.scad
use <../lib.scad>
use <4-4cyli.scad>
use <4-4disc.scad>
use <4-4edge.scad>
function ldraw_lib__stud() = [
// 0 Stud
// 0 Name: stud.dat
// 0 Author: James Jessiman
// 0 !LDRAW_ORG Primitive UPDATE 2012-01
// 0 !LICENSE Licensed under CC BY 4.0 : see CAreadme.txt
// 
// 0 BFC CERTIFY CCW
  [0,"BFC","CERTIFY"],
  [0,"BFC","CCW"],
// 
// 0 !HISTORY 2002-04-04 [sbliss] Modified for BFC compliance
// 0 !HISTORY 2002-04-25 [PTadmin] Official Update 2002-02
// 0 !HISTORY 2007-06-24 [PTadmin] Header formatted for Contributor Agreement
// 0 !HISTORY 2008-07-01 [PTadmin] Official Update 2008-01
// 0 !HISTORY 2012-02-16 [Philo] Changed to CCW
// 0 !HISTORY 2012-03-30 [PTadmin] Official Update 2012-01
// 
// 
// 1 16 0 0 0 6 0 0 0 1 0 0 0 6 4-4edge.dat
  [1,16,0,0,0,6,0,0,0,1,0,0,0,6, ldraw_lib__4_4edge()],
// 1 16 0 -4 0 6 0 0 0 1 0 0 0 6 4-4edge.dat
  [1,16,0,-4,0,6,0,0,0,1,0,0,0,6, ldraw_lib__4_4edge()],
// 1 16 0 0 0 6 0 0 0 -4 0 0 0 6 4-4cyli.dat
  [1,16,0,0,0,6,0,0,0,-4,0,0,0,6, ldraw_lib__4_4cyli()],
// 1 16 0 -4 0 6 0 0 0 1 0 0 0 6 4-4disc.dat
  [1,16,0,-4,0,6,0,0,0,1,0,0,0,6, ldraw_lib__4_4disc()],
  [-1,16,0,0,0,6,0,0,0,-1,0,0,0,6, ldraw_lib__4_4disc()],
];
module ldraw_lib__stud(step=0, col=false, unit=2/5, alt=false, line=0.2, solid=!$preview)
    makepoly(ldraw_lib__stud(), step=step, col=col, unit=unit, alt=alt, line=line, solid=solid);
ldraw_lib__stud(line=0.2);
// file: s/3001s02.scad
use <../../lib.scad>
use <../../p/box4.scad>
use <../../p/box5.scad>
use <../../p/stud4.scad>
function ldraw_lib__s__3001s02() = [
// 0 ~Brick  2 x  4 without Top and Top Studs
// 0 Name: s\3001s02.dat
// 0 Author: Rene Rechthaler [Blechtaler]
// 0 !LDRAW_ORG Subpart UPDATE 2024-09
// 0 !LICENSE Licensed under CC BY 4.0 : see CAreadme.txt
// 
// 0 BFC CERTIFY CCW
  [0,"BFC","CERTIFY"],
  [0,"BFC","CCW"],
// 
// 0 !HISTORY 2023-11-20 [Blechtaler] made from 3001s01
// 0 !HISTORY 2024-10-27 [OrionP] Official Update 2024-09
// 
// 1 16 20 4 0 1 0 0 0 -5 0 0 0 1 stud4.dat
  [1,16,20,4,0,1,0,0,0,-5,0,0,0,1, ldraw_lib__stud4()],
// 1 16 0 4 0 1 0 0 0 -5 0 0 0 1 stud4.dat
  [1,16,0,4,0,1,0,0,0,-5,0,0,0,1, ldraw_lib__stud4()],
// 1 16 -20 4 0 1 0 0 0 -5 0 0 0 1 stud4.dat
  [1,16,-20,4,0,1,0,0,0,-5,0,0,0,1, ldraw_lib__stud4()],
// 0 BFC INVERTNEXT
  [0,"BFC","INVERTNEXT"],
// 1 16 0 24 0 36 0 0 0 -20 0 0 0 16 box5.dat
  [1,16,0,24,0,36,0,0,0,-20,0,0,0,16, ldraw_lib__box5()],
// 4 16 40 24 20 36 24 16 -36 24 16 -40 24 20
  [4,16,40,24,20,36,24,16,-36,24,16,-40,24,20],
// 4 16 -40 24 20 -36 24 16 -36 24 -16 -40 24 -20
  [4,16,-40,24,20,-36,24,16,-36,24,-16,-40,24,-20],
// 4 16 -40 24 -20 -36 24 -16 36 24 -16 40 24 -20
  [4,16,-40,24,-20,-36,24,-16,36,24,-16,40,24,-20],
// 4 16 40 24 -20 36 24 -16 36 24 16 40 24 20
  [4,16,40,24,-20,36,24,-16,36,24,16,40,24,20],
// 1 16 0 24 0 0 0 40 0 -24 0 -20 0 0 box4.dat
  [1,16,0,24,0,0,0,40,0,-24,0,-20,0,0, ldraw_lib__box4()],
];
module ldraw_lib__s__3001s02(step=0, col=false, unit=2/5, alt=false, line=0.2, solid=!$preview)
    makepoly(ldraw_lib__s__3001s02(), step=step, col=col, unit=unit, alt=alt, line=line, solid=solid);
ldraw_lib__s__3001s02(line=0.2);
// main file
use <../lib.scad>
use <s/3001s02.scad>
use <../p/stud.scad>
function ldraw_lib__60290() = [
// 0 Brick Braille 2 x 4 with 6 Studs (DOTS-123456)
// 0 Name: 60290.dat
// 0 Author: Rene Rechthaler [Blechtaler]
// 0 !LDRAW_ORG Part UPDATE 2025-08
// 0 !LICENSE Licensed under CC BY 4.0 : see CAreadme.txt
// 
// 0 BFC CERTIFY CCW
  [0,"BFC","CERTIFY"],
  [0,"BFC","CCW"],
// 
// 0 !KEYWORDS ⠿ Unicode U+283F (10303), set 40656, set 40722, set 40724
// 
// 0 !HISTORY 2024-08-18 [MagFors] Changed orientation, added keywords
// 0 !HISTORY 2025-08-31 [OrionP] Official Update 2025-08
// 
// 1 16 0 0 0 1 0 0 0 1 0 0 0 1 s\3001s02.dat
  [1,16,0,0,0,1,0,0,0,1,0,0,0,1, ldraw_lib__s__3001s02()],
// 1 16 -30 0 -10 1 0 0 0 1 0 0 0 1 stud.dat
  [1,16,-30,0,-10,1,0,0,0,1,0,0,0,1, ldraw_lib__stud()],
// 1 16 -30 0 10 1 0 0 0 1 0 0 0 1 stud.dat
  [1,16,-30,0,10,1,0,0,0,1,0,0,0,1, ldraw_lib__stud()],
// 1 16 -10 0 -10 1 0 0 0 1 0 0 0 1 stud.dat
  [1,16,-10,0,-10,1,0,0,0,1,0,0,0,1, ldraw_lib__stud()],
// 1 16 -10 0 10 1 0 0 0 1 0 0 0 1 stud.dat
  [1,16,-10,0,10,1,0,0,0,1,0,0,0,1, ldraw_lib__stud()],
// 1 16 10 0 -10 1 0 0 0 1 0 0 0 1 stud.dat
  [1,16,10,0,-10,1,0,0,0,1,0,0,0,1, ldraw_lib__stud()],
// 1 16 10 0 10 1 0 0 0 1 0 0 0 1 stud.dat
  [1,16,10,0,10,1,0,0,0,1,0,0,0,1, ldraw_lib__stud()],
// 
// 4 16 40 0 -20 40 0 20 -40 0 20 -40 0 -20
  [4,16,40,0,-20,40,0,20,-40,0,20,-40,0,-20],
];
module ldraw_lib__60290(step=0, col=false, unit=2/5, alt=false, line=0.2, solid=!$preview)
    makepoly(ldraw_lib__60290(), step=step, col=col, unit=unit, alt=alt, line=line, solid=solid);
ldraw_lib__60290(line=0.2);
